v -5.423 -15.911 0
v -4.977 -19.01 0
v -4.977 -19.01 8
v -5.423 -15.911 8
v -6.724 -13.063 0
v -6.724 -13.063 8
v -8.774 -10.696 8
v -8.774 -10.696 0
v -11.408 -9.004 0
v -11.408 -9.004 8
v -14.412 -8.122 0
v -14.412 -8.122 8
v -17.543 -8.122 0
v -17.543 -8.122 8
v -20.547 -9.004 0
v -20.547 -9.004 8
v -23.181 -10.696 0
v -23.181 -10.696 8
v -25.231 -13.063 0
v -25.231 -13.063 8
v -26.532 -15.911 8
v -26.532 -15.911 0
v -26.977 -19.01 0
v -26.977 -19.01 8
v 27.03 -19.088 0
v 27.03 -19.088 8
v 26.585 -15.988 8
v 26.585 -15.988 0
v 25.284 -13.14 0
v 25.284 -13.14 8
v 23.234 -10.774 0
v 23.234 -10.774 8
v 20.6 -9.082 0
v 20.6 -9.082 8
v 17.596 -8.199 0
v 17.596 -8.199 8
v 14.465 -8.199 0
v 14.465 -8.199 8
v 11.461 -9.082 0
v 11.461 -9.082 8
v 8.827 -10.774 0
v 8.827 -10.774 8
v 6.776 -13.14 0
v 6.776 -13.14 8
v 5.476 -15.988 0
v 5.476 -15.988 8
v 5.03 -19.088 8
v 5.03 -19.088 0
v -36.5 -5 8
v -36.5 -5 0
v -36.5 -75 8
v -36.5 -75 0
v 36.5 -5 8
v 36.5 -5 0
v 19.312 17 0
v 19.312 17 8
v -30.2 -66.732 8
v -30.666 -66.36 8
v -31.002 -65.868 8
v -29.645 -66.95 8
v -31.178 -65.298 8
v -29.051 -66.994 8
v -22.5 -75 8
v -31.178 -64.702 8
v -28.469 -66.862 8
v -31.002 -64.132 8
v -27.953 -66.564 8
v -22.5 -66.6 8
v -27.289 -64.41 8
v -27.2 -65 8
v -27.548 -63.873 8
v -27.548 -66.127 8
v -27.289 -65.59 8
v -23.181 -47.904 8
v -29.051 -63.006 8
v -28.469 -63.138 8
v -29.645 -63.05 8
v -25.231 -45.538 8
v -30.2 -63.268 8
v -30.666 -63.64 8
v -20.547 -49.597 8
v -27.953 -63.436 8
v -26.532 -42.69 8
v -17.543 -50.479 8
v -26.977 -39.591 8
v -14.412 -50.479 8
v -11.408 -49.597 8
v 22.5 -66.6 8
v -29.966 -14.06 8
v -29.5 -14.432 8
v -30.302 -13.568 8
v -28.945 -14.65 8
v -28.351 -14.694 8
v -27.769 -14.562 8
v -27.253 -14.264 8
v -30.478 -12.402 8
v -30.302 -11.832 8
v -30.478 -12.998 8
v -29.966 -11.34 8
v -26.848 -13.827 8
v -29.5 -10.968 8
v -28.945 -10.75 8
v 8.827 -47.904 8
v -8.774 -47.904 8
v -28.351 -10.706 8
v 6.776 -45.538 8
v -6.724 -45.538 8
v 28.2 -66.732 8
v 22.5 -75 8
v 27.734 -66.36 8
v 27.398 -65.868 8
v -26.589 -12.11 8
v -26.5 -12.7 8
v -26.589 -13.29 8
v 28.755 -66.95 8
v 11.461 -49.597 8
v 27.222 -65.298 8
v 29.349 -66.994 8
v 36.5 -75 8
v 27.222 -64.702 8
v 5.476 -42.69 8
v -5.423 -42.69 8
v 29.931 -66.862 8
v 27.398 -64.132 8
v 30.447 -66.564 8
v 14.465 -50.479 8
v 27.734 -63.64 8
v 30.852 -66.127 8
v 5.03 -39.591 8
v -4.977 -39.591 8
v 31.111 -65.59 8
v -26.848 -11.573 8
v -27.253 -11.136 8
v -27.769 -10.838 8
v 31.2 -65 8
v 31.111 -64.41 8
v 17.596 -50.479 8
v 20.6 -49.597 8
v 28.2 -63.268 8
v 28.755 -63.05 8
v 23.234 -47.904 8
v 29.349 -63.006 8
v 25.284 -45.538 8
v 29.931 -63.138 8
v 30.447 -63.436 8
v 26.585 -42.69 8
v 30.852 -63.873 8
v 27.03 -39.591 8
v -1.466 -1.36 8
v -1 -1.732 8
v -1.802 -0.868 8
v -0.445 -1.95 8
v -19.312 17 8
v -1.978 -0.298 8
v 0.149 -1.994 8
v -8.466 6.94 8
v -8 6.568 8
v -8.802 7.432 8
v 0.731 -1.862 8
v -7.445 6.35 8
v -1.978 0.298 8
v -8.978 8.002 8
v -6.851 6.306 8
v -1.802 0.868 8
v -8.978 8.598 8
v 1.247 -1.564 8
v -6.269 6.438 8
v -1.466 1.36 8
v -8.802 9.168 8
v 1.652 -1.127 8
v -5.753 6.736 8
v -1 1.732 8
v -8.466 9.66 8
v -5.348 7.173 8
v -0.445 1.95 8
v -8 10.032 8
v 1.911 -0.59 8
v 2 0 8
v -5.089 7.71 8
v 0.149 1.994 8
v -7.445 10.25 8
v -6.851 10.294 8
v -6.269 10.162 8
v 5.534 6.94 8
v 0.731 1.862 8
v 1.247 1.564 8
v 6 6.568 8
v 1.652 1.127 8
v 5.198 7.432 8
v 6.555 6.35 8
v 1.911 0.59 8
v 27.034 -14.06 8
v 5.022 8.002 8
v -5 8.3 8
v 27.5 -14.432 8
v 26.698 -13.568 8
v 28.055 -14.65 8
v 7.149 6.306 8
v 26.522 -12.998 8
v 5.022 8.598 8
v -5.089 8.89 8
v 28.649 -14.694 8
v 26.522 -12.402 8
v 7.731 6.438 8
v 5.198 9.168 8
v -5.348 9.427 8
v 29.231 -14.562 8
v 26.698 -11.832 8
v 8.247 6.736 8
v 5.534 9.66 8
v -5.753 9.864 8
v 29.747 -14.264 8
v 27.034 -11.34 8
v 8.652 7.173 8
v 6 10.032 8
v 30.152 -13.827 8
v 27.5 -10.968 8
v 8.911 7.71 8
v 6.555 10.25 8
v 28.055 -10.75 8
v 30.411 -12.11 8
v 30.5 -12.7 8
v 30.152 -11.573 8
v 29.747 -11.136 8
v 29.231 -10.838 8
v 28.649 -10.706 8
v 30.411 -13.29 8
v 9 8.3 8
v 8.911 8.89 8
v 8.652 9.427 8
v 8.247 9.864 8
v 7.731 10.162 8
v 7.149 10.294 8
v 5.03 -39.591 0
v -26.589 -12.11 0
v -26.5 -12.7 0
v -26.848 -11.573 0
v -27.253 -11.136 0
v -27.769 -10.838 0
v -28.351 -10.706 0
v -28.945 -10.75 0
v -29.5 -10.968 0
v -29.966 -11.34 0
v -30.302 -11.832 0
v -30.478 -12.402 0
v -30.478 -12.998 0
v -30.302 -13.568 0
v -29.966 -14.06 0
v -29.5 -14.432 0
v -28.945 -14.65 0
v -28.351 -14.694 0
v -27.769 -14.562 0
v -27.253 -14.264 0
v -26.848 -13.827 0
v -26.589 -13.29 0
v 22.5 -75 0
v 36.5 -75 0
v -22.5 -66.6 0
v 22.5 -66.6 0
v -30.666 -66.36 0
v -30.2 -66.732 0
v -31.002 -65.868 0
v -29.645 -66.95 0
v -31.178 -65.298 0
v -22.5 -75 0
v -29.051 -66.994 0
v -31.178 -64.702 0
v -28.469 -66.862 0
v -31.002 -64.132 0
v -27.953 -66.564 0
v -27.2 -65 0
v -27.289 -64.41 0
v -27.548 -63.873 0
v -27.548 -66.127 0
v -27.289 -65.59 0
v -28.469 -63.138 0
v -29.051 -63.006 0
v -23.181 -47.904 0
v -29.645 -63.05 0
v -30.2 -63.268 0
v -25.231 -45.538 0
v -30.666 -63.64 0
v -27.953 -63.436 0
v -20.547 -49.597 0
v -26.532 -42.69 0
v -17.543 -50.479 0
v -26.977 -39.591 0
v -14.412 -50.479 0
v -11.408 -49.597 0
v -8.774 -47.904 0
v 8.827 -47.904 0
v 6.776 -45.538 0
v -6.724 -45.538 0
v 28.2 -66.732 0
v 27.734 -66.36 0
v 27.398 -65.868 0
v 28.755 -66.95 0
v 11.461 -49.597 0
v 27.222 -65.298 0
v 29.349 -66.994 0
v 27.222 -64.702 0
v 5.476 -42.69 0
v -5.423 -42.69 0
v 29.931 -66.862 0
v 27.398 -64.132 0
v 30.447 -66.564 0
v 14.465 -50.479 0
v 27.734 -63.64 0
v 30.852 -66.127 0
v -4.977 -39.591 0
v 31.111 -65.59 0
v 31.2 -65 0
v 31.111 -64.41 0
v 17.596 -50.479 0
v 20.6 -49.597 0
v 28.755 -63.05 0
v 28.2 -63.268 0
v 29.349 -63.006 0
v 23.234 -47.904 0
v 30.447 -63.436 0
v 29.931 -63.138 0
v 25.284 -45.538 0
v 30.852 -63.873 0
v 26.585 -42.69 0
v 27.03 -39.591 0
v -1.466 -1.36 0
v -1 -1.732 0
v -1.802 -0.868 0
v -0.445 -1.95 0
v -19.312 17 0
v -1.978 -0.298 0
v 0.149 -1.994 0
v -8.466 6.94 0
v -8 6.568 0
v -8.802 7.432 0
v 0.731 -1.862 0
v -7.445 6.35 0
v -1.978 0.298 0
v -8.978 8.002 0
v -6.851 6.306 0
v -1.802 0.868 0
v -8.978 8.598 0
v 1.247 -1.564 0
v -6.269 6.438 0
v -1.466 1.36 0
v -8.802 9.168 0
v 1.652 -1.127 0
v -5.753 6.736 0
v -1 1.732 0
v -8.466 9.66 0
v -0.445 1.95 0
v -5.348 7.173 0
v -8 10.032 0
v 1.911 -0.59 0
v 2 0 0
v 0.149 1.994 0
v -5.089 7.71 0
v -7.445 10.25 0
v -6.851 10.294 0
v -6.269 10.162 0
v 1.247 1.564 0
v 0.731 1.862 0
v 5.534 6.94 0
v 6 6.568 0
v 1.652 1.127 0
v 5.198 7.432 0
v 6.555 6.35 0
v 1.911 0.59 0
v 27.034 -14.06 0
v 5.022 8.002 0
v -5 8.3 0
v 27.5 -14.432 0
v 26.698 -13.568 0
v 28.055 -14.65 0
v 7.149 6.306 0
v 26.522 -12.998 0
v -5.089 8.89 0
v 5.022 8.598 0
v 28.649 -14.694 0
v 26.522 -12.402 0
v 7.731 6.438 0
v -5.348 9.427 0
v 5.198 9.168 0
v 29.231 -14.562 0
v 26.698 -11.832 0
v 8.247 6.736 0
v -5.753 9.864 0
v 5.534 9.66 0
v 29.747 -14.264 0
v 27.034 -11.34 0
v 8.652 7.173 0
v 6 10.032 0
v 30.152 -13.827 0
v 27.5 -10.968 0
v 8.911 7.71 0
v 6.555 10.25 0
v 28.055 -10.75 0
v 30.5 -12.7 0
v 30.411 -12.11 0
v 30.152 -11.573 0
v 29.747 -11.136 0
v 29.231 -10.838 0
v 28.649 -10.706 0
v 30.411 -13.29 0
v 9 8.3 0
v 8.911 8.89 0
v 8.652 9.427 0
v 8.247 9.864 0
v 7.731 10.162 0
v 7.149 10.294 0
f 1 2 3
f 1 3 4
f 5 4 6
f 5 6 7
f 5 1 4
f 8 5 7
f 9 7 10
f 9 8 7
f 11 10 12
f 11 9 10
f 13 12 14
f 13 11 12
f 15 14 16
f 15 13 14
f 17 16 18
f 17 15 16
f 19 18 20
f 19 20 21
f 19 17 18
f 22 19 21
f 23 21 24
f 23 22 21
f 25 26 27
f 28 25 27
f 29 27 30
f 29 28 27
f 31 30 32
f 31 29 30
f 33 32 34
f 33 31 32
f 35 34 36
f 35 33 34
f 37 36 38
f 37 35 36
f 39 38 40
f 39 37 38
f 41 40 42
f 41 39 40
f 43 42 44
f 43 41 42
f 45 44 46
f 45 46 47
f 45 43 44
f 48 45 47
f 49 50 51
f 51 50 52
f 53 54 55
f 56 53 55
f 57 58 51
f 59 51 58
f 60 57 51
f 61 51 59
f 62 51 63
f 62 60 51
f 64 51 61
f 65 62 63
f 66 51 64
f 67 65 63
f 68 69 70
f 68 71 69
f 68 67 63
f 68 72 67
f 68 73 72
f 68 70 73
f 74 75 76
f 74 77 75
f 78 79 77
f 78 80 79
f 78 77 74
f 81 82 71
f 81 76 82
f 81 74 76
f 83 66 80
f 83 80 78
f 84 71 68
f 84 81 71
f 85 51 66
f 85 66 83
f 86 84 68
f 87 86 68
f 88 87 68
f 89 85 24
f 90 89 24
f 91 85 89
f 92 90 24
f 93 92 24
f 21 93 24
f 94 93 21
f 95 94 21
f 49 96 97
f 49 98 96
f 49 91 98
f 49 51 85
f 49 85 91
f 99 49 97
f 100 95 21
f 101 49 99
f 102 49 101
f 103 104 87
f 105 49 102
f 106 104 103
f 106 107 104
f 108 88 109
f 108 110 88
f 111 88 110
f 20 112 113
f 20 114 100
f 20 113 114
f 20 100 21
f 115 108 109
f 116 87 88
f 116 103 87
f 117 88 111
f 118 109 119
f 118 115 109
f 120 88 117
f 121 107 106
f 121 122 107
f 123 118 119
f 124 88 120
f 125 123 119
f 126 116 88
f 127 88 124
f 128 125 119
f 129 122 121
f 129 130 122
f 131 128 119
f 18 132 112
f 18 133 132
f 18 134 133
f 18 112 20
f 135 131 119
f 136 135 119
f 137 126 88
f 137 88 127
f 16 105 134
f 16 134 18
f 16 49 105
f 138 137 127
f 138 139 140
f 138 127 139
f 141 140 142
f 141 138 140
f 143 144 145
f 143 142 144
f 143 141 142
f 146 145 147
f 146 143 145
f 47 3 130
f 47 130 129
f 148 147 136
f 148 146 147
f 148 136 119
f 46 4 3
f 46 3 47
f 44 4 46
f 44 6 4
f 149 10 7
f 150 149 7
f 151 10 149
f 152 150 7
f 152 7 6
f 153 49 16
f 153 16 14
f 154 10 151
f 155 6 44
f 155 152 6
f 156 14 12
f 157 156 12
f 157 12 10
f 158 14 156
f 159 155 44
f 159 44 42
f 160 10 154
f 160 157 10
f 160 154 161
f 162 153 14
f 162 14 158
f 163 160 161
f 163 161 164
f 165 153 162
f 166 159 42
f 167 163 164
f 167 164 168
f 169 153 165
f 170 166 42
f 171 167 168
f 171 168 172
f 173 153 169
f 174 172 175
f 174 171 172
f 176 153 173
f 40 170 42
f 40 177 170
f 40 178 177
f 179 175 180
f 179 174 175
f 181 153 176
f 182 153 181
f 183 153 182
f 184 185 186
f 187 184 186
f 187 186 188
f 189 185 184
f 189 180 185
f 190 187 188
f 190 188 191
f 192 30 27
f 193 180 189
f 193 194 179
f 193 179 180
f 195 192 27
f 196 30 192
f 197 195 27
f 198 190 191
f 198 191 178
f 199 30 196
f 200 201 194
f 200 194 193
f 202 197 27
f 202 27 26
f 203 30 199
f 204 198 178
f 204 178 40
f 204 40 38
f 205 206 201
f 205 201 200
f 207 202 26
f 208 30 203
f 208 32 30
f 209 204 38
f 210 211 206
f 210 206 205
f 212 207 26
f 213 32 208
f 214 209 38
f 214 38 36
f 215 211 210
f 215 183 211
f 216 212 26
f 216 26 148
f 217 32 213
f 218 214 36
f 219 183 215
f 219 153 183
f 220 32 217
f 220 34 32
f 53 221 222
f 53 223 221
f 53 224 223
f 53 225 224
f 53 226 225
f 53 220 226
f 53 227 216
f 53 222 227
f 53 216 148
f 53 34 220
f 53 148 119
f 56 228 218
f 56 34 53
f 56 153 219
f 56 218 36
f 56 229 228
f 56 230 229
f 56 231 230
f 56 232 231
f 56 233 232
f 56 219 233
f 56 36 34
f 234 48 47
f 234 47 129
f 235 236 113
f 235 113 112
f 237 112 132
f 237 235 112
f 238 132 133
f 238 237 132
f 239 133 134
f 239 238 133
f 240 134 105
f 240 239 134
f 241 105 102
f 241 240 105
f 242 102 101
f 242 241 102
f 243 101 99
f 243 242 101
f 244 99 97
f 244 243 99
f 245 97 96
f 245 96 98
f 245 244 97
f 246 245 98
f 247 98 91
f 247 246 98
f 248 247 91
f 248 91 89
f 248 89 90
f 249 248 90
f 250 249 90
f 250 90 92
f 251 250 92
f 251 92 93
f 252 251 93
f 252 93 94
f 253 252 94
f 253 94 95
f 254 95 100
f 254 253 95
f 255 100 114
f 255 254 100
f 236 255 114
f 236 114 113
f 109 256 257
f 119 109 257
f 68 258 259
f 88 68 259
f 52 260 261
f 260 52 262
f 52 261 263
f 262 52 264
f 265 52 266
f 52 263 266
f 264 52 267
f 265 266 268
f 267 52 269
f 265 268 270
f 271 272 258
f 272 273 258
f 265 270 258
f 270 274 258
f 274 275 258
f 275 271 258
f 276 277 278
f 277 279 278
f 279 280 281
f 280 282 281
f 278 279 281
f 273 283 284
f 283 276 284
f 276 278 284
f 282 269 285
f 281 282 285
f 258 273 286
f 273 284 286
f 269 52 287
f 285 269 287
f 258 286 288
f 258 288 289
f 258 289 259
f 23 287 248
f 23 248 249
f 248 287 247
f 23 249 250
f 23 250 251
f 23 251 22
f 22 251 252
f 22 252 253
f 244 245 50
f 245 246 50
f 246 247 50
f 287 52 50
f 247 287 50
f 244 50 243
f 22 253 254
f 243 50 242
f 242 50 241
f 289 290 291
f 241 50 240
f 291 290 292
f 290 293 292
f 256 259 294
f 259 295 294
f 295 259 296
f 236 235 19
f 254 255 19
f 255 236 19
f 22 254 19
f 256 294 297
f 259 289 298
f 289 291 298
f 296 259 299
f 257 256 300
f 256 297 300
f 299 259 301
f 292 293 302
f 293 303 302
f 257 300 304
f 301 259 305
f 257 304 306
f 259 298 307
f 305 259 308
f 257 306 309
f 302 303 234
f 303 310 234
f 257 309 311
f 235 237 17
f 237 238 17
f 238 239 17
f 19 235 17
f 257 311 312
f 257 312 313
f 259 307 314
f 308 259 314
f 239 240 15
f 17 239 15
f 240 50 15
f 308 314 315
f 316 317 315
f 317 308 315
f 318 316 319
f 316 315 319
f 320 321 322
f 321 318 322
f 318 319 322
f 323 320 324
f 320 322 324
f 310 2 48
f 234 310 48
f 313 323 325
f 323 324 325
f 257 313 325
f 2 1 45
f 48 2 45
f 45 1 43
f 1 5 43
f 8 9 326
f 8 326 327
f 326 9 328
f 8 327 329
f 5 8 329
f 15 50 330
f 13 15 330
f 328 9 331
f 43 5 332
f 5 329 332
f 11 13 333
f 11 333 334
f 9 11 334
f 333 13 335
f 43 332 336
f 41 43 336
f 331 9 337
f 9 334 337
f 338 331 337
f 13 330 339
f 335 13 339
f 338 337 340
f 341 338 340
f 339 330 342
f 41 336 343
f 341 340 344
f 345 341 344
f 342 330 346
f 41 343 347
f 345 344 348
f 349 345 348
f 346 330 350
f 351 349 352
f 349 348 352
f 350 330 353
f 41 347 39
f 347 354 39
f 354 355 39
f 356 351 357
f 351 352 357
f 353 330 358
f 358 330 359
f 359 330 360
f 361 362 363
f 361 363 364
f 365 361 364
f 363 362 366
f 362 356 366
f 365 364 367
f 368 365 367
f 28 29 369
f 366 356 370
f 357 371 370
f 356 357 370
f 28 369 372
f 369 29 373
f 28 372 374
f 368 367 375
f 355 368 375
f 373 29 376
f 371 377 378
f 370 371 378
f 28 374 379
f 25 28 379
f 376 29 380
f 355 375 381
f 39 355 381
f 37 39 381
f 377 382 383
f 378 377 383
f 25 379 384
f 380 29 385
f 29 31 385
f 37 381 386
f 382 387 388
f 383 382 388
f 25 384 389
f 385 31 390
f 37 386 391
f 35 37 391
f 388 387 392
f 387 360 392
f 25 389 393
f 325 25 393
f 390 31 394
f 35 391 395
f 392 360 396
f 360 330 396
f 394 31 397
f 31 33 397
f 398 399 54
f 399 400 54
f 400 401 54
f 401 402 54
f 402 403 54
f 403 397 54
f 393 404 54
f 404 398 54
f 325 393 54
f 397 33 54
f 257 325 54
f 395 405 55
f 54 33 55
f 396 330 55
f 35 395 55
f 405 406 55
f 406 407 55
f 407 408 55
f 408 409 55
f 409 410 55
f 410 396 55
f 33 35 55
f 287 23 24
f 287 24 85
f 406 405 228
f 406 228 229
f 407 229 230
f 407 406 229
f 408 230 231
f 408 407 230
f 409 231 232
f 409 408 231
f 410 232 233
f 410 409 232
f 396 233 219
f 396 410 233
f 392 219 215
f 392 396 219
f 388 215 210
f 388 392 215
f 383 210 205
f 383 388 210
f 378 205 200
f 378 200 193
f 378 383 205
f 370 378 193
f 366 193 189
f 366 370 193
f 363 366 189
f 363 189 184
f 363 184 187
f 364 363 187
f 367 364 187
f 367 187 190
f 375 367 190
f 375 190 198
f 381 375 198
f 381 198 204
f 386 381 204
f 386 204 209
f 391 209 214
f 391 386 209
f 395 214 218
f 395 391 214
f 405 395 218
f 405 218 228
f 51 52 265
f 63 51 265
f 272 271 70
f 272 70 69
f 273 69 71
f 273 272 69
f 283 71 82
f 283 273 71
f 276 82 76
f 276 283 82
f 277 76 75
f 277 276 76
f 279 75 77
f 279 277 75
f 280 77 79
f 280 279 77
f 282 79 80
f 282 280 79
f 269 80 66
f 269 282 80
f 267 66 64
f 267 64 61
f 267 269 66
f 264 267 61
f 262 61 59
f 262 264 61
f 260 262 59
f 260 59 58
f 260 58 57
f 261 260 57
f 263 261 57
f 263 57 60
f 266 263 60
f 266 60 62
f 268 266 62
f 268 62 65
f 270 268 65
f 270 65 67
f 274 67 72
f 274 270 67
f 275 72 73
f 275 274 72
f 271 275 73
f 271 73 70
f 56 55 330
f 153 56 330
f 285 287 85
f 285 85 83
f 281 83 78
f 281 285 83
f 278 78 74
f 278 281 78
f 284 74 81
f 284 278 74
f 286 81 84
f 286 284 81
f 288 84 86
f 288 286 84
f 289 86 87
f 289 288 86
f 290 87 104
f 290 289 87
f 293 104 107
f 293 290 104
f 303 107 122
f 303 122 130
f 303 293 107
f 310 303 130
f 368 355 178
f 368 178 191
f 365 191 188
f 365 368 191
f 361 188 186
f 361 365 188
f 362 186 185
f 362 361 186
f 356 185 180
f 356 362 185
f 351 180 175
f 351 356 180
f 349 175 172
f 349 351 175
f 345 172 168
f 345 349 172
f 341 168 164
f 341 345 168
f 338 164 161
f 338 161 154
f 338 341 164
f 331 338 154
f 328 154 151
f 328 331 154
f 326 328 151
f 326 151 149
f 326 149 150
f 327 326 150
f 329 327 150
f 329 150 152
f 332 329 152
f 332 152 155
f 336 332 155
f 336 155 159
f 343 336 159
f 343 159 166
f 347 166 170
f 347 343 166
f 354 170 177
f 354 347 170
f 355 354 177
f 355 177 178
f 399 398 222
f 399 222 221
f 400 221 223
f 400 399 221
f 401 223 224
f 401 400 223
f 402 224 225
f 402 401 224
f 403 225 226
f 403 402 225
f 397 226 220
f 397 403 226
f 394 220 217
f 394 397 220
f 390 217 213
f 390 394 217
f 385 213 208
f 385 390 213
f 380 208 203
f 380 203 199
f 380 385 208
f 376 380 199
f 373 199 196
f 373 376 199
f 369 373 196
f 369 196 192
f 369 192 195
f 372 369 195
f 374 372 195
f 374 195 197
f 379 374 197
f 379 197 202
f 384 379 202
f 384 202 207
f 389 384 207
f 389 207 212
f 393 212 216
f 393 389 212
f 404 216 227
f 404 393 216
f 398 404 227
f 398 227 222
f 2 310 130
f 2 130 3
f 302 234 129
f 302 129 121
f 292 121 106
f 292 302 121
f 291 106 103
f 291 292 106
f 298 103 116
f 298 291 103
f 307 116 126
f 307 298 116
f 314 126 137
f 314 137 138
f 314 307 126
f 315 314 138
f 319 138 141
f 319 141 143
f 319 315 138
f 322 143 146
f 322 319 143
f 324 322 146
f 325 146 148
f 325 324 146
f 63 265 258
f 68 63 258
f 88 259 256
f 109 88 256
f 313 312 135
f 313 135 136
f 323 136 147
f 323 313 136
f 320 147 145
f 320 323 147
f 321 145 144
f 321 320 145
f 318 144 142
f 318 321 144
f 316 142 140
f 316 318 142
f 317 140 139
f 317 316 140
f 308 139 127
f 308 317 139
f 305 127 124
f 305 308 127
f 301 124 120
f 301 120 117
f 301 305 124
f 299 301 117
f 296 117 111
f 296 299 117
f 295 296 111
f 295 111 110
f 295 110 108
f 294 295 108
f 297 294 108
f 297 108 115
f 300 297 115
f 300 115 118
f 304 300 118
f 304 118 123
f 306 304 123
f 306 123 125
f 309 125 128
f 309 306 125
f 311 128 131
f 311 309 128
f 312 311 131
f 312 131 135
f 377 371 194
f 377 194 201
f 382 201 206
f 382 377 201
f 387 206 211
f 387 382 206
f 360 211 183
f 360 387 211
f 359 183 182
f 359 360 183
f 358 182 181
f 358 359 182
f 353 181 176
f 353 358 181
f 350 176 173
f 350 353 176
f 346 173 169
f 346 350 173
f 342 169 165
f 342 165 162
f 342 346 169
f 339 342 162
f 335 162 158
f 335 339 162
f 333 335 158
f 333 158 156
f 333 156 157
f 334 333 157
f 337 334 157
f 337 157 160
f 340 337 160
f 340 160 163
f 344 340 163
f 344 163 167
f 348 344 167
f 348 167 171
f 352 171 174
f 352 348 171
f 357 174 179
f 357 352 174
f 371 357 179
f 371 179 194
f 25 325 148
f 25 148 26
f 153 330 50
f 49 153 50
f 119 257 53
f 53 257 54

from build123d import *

# Parameters (mm, degrees)
ESBO_O2_R                = 2
RESSALTO_EXTRUS_O1_DEPTH = 8


with BuildPart() as part:
    # Esboço2 → Ressalto-extrusão1 (new body)
    with BuildSketch(Plane.XY):
        Polygon((36.5, -75), (36.5, -5), (19.311716217, 17), (-19.311716217, 17), (-36.5, -5), (-36.5, -75), (-22.499999998, -75), (-22.499999998, -66.599999996), (22.499999998, -66.599999996), (22.499999998, -75), align=None)
        with Locations((28.5, -12.7)):
            Circle(ESBO_O2_R, mode=Mode.SUBTRACT)
        with Locations((29.2, -65)):
            Circle(ESBO_O2_R, mode=Mode.SUBTRACT)
        with Locations((-29.2, -65)):
            Circle(ESBO_O2_R, mode=Mode.SUBTRACT)
        with Locations((-28.5, -12.7)):
            Circle(ESBO_O2_R, mode=Mode.SUBTRACT)
        with Locations((7, 8.3)):
            Circle(ESBO_O2_R, mode=Mode.SUBTRACT)
        with Locations((-7, 8.3)):
            Circle(ESBO_O2_R, mode=Mode.SUBTRACT)
        Circle(ESBO_O2_R, mode=Mode.SUBTRACT)
        with BuildLine():
            ThreePointArc((5.030193795, -39.591075239), (16.030188189, -50.591069634), (27.030182584, -39.591075239))
            Line((27.030182584, -39.591075239), (27.030169807, -19.087507994))
            ThreePointArc((27.030169807, -19.087507994), (16.030168558, -8.087513599), (5.030181018, -19.087507994))
            Line((5.030181018, -19.087507994), (5.030193795, -39.591075239))
        make_face(mode=Mode.SUBTRACT)
        with BuildLine():
            ThreePointArc((-26.977366802, -39.591075239), (-15.977372644, -50.591069397), (-4.977378486, -39.591075239))
            Line((-4.977378486, -39.591075239), (-4.977391172, -19.009684113))
            ThreePointArc((-4.977391172, -19.009684113), (-15.977385329, -8.009689955), (-26.977379487, -19.009684113))
            Line((-26.977379487, -19.009684113), (-26.977366802, -39.591075239))
        make_face(mode=Mode.SUBTRACT)
    extrude(amount=RESSALTO_EXTRUS_O1_DEPTH)


solid = part.part
